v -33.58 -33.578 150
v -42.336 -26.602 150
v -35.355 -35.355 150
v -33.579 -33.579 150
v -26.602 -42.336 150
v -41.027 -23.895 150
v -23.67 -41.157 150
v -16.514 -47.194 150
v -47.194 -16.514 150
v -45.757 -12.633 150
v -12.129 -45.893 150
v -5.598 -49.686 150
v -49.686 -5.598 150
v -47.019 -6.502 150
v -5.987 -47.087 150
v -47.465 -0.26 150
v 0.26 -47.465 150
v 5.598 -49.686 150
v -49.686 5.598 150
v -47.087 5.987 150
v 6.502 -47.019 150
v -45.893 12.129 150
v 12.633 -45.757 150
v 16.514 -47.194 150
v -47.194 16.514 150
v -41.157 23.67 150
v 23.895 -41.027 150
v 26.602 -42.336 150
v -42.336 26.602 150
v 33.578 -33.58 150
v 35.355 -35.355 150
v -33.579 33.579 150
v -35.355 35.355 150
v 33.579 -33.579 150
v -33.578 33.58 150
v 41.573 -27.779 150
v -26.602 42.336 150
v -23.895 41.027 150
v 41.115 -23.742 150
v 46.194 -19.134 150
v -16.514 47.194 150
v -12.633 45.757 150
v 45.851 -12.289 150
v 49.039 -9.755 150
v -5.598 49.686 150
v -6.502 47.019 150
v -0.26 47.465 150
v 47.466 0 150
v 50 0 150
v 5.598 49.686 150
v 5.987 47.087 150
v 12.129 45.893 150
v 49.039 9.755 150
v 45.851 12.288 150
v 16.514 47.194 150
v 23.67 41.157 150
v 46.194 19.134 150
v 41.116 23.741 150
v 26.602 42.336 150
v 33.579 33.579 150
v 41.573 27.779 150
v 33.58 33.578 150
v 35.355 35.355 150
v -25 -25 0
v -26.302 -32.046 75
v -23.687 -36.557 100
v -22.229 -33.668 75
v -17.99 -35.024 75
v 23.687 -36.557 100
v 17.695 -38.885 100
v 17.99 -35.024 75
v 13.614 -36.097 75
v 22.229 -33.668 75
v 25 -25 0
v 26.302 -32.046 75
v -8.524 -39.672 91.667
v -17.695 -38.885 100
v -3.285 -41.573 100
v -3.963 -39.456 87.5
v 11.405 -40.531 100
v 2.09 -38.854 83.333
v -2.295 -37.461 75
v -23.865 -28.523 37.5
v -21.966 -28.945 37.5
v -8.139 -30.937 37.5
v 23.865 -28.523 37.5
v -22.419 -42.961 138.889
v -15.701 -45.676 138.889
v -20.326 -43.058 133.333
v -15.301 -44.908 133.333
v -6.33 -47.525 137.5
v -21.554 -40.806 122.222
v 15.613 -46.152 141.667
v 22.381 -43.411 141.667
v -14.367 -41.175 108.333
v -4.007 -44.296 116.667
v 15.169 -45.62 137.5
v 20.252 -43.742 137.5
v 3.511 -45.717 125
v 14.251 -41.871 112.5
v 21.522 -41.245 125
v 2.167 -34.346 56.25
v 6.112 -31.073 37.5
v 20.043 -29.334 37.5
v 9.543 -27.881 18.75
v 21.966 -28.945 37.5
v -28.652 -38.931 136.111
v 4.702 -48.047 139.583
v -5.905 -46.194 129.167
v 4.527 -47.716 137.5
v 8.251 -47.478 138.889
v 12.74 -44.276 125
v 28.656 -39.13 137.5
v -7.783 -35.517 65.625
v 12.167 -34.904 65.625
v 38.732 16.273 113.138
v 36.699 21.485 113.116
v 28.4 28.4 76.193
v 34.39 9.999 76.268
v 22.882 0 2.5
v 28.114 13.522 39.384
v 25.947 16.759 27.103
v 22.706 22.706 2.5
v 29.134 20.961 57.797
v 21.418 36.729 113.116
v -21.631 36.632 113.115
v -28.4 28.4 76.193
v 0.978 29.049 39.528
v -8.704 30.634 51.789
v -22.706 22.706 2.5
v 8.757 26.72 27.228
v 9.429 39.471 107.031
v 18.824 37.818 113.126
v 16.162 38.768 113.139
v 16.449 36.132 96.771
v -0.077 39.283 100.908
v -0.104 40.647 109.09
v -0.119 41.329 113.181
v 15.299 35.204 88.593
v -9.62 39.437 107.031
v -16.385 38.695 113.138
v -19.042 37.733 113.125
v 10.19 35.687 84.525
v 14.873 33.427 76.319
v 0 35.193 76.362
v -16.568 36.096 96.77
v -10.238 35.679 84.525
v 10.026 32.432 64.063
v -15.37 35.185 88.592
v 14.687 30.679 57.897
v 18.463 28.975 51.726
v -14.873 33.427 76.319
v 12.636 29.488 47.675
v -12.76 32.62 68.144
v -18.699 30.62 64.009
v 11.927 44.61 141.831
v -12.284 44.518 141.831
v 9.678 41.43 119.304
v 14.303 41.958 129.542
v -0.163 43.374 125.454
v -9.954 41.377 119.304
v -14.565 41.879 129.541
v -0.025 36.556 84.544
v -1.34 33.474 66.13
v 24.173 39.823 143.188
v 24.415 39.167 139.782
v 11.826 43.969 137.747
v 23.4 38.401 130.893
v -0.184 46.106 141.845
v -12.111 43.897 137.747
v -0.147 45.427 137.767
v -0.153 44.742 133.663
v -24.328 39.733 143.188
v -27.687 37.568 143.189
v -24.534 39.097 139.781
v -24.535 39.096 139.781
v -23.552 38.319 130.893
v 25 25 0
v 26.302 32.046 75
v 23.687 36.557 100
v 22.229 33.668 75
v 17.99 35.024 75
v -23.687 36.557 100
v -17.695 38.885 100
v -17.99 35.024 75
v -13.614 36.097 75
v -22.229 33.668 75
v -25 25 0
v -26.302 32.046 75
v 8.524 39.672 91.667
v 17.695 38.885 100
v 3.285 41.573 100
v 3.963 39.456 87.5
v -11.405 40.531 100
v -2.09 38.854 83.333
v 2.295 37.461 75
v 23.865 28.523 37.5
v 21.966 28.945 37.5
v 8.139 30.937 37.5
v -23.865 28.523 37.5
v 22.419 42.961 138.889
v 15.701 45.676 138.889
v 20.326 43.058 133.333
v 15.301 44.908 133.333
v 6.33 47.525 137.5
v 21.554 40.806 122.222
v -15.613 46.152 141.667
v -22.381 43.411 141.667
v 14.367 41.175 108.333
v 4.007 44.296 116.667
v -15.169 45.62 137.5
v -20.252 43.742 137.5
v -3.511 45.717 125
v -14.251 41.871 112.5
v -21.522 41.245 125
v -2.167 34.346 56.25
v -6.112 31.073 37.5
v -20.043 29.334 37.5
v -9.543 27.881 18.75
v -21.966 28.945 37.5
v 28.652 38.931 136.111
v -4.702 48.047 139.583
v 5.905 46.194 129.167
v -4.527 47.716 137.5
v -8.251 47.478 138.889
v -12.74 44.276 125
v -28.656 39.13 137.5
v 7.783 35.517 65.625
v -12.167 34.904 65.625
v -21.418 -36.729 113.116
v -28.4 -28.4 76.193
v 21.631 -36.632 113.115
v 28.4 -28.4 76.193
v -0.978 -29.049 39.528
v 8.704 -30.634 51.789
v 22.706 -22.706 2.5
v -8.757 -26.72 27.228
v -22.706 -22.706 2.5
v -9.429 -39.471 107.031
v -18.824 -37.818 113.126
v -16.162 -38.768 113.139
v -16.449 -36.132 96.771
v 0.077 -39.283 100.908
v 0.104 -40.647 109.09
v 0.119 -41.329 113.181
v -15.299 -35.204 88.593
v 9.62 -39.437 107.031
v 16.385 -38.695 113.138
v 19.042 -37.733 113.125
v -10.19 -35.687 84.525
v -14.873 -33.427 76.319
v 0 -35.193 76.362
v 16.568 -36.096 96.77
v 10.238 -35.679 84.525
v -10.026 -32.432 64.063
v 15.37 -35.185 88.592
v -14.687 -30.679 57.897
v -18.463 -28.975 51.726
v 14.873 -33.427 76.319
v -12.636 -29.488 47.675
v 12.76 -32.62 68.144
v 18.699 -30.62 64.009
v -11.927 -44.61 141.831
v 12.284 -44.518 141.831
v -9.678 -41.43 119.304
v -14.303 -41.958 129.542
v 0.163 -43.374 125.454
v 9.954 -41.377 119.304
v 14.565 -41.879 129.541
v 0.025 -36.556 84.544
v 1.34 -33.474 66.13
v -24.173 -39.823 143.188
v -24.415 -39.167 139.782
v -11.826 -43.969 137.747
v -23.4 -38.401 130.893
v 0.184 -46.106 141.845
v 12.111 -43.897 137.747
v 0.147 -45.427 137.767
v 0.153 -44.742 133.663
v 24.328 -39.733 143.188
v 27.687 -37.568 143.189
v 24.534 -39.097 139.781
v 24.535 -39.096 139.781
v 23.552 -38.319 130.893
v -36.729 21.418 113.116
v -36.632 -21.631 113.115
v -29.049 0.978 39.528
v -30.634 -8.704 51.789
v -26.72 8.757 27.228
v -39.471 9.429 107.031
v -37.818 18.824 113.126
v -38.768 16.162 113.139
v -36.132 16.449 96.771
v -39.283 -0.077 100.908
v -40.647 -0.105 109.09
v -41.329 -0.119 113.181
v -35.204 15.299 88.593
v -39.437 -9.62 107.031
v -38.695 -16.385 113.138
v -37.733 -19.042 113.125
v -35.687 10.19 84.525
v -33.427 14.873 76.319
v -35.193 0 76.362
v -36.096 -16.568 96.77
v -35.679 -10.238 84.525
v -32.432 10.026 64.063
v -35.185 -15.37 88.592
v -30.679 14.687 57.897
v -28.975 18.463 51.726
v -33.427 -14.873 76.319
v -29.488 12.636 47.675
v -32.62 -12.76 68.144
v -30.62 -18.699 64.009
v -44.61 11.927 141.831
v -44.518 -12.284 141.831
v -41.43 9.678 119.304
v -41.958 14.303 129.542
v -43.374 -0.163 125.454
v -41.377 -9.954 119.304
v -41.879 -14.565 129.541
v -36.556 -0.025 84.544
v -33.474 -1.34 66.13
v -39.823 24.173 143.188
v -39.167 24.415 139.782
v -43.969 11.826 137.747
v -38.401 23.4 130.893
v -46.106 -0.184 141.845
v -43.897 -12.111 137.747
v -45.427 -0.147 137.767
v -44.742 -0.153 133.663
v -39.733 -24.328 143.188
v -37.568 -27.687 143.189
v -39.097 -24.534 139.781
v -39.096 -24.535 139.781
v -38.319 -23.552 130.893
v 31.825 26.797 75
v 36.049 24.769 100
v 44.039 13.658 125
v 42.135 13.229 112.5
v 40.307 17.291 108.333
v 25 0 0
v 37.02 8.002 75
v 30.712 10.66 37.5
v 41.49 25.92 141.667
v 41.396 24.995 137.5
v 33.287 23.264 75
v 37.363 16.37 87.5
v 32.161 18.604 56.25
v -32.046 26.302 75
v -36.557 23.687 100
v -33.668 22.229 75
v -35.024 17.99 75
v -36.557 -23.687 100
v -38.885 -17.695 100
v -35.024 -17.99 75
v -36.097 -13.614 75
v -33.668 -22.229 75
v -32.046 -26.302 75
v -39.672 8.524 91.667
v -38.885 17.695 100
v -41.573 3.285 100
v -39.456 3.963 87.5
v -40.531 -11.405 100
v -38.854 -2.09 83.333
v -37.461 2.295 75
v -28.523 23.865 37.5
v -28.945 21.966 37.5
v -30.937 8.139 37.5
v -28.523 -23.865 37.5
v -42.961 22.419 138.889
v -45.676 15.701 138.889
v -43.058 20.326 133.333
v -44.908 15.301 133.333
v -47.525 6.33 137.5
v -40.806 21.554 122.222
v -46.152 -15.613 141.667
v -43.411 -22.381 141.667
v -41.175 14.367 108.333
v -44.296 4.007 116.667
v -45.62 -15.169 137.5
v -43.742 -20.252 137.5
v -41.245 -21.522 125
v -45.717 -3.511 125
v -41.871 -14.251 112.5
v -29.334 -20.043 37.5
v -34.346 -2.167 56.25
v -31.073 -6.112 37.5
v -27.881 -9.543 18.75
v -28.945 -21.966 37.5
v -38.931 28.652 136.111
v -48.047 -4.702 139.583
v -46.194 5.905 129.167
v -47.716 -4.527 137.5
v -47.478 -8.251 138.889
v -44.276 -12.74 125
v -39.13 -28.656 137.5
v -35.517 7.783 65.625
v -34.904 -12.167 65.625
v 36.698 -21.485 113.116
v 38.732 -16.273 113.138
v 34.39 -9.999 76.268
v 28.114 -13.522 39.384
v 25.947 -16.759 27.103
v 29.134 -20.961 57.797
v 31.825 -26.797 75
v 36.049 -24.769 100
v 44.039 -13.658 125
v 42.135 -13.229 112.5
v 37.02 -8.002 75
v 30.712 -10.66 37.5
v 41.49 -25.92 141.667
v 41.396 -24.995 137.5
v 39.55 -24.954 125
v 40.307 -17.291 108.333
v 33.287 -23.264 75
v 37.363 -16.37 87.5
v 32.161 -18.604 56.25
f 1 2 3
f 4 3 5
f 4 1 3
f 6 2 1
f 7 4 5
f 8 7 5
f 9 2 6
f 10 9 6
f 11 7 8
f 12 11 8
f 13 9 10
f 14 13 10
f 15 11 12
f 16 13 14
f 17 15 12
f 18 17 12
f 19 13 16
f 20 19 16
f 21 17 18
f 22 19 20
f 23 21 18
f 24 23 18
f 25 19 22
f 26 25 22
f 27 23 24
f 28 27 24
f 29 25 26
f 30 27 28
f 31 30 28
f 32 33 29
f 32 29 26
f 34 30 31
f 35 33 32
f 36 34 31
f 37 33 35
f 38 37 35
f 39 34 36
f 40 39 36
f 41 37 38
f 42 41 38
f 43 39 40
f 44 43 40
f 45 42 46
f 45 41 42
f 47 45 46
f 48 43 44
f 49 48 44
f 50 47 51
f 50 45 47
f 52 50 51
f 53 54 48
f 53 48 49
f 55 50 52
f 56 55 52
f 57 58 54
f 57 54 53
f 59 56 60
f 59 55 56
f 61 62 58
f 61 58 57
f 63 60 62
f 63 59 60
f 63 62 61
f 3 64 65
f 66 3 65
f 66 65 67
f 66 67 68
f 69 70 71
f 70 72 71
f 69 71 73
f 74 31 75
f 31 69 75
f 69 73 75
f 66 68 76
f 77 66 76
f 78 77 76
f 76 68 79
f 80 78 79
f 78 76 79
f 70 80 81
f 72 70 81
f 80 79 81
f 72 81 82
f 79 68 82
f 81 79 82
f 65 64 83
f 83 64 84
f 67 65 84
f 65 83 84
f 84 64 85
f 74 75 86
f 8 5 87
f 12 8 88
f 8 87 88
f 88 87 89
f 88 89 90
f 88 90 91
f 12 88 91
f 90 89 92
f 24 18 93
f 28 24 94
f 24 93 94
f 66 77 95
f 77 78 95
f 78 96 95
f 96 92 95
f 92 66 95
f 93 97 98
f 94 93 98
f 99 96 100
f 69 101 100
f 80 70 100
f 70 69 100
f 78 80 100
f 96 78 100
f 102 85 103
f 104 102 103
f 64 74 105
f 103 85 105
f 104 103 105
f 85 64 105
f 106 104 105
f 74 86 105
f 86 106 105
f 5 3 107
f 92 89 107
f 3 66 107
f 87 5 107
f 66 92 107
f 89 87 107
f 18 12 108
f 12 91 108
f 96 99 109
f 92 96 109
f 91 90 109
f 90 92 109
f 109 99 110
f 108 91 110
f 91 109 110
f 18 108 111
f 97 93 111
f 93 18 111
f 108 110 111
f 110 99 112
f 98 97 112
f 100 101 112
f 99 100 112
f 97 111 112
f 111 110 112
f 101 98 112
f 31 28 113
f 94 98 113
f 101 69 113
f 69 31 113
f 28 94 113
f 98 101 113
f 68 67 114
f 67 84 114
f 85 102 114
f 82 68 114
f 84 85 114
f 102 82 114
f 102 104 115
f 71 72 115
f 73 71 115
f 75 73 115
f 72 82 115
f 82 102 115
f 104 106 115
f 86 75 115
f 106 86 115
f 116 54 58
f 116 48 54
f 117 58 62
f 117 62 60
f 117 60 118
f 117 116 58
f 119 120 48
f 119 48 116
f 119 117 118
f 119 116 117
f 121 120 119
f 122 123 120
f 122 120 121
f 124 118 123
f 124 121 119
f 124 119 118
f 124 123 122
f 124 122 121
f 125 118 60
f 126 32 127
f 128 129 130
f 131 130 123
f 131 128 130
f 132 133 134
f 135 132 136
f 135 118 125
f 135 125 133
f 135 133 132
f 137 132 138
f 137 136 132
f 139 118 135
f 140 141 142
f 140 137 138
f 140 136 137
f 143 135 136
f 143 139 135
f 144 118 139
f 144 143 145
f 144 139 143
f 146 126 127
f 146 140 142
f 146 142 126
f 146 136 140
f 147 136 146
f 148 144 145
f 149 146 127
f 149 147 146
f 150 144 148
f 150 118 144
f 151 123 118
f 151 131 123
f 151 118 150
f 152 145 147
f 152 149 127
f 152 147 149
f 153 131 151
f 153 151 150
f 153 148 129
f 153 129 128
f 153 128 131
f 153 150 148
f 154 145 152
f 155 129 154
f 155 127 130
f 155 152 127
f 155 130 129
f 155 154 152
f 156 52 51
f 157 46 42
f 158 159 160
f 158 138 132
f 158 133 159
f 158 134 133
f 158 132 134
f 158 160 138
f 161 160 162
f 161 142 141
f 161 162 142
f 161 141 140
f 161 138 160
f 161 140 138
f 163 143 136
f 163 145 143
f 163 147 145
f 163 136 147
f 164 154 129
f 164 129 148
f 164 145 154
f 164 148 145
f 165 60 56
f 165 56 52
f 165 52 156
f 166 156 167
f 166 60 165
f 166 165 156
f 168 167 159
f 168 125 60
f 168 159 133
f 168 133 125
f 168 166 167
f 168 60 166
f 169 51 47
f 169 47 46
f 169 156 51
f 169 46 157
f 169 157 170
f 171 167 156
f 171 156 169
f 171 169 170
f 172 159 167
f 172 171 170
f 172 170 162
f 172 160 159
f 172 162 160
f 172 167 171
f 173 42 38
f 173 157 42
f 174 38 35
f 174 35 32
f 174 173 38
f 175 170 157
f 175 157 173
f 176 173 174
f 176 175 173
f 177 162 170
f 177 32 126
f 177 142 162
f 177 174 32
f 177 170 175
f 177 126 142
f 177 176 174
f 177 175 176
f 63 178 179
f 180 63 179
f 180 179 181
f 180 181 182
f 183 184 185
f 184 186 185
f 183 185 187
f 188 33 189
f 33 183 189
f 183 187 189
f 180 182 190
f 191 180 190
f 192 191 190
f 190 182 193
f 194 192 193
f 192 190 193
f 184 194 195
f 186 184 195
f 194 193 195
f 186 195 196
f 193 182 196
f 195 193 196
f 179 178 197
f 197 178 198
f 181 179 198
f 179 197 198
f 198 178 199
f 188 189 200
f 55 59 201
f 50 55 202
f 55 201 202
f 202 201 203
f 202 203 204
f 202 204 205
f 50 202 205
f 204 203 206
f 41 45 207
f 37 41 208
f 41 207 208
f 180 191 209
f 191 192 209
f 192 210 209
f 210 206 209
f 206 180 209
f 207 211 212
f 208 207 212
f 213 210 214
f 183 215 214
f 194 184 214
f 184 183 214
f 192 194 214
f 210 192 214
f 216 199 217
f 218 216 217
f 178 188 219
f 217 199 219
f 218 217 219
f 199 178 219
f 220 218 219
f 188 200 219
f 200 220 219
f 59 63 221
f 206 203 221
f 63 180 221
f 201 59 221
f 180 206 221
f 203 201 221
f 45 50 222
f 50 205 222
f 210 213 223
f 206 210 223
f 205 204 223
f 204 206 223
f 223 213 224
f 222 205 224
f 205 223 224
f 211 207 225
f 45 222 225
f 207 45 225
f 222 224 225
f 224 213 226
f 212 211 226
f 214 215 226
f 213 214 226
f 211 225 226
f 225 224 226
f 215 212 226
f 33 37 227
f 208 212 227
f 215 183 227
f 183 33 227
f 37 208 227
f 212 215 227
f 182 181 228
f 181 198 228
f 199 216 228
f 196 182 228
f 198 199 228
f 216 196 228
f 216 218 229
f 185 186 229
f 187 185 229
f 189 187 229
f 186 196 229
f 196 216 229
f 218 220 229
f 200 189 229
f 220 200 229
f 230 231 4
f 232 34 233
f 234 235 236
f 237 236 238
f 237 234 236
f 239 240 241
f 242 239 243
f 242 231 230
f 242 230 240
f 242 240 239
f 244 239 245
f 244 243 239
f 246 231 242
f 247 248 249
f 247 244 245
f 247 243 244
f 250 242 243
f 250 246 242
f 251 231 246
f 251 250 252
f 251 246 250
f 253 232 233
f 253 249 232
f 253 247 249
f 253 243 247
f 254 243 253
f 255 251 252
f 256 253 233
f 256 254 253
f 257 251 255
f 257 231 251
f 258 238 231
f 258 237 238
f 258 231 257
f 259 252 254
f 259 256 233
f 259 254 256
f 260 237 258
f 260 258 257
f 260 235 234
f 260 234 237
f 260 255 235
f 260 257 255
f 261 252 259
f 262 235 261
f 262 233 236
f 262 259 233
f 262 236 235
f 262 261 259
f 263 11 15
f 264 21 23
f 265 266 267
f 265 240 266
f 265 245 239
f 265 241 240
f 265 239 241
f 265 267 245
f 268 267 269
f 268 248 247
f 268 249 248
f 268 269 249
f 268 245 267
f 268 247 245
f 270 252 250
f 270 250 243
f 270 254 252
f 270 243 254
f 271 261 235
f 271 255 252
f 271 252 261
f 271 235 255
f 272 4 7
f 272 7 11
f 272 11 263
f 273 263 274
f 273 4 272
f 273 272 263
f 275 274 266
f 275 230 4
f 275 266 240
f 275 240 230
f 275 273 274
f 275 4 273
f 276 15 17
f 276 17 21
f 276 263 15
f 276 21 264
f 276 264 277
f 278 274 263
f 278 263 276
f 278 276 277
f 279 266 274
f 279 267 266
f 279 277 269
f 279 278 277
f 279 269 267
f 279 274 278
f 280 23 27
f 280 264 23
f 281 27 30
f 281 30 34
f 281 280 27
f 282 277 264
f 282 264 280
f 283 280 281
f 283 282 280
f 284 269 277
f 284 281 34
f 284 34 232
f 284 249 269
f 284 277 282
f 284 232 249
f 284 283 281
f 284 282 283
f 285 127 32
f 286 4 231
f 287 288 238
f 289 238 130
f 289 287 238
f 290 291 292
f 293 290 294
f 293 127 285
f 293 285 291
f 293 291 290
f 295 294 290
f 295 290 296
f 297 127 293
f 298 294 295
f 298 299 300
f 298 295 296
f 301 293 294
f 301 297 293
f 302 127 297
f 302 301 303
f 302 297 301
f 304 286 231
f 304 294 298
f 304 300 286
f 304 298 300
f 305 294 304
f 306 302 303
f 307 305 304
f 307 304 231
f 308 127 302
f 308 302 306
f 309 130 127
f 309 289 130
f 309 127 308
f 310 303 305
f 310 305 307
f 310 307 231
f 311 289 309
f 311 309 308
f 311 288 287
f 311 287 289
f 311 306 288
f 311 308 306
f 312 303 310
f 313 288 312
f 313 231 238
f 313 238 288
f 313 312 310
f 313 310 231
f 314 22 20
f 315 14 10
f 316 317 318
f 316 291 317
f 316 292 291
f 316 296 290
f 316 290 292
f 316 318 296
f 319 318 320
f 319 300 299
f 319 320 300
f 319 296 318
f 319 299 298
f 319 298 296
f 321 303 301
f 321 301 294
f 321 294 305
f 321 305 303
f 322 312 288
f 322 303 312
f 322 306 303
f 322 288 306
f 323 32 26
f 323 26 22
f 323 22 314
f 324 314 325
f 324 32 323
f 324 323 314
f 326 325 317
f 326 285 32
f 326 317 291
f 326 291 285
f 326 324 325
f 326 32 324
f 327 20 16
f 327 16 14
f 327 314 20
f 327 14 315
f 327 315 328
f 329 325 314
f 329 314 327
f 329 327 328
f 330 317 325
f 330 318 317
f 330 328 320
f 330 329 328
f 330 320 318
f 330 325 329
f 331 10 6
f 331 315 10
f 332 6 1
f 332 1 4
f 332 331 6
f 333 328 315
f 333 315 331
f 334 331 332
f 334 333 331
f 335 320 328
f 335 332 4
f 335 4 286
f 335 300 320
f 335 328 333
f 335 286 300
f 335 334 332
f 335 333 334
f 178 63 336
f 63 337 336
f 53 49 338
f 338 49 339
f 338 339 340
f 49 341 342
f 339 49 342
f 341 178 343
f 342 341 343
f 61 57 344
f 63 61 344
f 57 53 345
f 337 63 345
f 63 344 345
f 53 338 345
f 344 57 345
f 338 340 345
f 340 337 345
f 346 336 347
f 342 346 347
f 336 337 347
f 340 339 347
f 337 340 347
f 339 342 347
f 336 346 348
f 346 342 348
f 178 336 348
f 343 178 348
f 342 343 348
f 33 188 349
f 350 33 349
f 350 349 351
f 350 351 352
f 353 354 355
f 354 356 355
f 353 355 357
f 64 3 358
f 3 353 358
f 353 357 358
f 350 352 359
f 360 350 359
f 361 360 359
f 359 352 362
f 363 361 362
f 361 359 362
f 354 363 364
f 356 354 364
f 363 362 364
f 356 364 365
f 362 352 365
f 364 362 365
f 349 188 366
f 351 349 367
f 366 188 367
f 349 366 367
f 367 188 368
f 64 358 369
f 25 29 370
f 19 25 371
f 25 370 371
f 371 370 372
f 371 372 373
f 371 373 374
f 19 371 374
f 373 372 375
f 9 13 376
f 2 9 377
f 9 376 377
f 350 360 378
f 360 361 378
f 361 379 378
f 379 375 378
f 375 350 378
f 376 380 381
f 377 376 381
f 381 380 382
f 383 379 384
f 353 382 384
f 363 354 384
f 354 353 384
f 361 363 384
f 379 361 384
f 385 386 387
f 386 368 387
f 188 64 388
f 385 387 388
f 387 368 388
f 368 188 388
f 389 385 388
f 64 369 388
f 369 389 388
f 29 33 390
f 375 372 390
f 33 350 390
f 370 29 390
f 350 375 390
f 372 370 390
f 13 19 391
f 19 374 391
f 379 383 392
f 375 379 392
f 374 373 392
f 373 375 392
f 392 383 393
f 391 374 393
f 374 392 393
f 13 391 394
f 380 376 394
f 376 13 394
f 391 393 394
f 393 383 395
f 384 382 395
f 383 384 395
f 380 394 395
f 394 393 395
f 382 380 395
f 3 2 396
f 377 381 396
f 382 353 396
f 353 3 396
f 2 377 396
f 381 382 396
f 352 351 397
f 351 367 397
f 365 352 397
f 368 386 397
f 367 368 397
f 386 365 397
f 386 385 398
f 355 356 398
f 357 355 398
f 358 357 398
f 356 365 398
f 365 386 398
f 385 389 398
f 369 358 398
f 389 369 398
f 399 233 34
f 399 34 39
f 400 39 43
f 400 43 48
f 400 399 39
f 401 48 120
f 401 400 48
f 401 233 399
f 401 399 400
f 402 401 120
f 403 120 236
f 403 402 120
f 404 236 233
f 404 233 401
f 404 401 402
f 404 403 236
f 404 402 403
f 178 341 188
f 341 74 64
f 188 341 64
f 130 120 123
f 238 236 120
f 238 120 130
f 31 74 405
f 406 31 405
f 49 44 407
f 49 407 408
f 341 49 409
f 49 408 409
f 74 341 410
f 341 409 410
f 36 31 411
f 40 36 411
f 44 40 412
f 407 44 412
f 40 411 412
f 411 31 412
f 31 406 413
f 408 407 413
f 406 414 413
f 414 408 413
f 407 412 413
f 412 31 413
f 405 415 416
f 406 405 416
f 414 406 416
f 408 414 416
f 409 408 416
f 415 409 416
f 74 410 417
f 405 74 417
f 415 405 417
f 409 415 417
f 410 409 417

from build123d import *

# Parameters (mm, degrees)
F2_R = 50
F1_W = 50
F1_H = 50
F4_T = 2.5


# Not quite as in the source:
# - a shell that OpenCascade refuses in one call is made with other operations: the cavity is built on its own and cut out


with BuildPart() as f3:
    # F2 (on offset) → F3 section 0
    with BuildSketch(Plane.XY.offset(150)):
        Circle(F2_R)
    # F1 (on Top) → F3 section 1
    with BuildSketch(Plane.XY):
        Rectangle(F1_W, F1_H)
    loft()

    # F4: shell of thickness 2.5, made by hand


with BuildPart() as f4_core1:
    # F4_t2: copy of F3
    add(f3.part)

    # the walls: a layer under each face that stays
    f4_faces = [f4_core1.faces().sort_by_distance(p)[0] for p in [
        (35.5969883078, 15.8170858071, 75),
        (0, 37.4999999981, 75),
        (-37.4999999981, 0, 75),
        (0, -37.4999999981, 75),
        (35.5969883078, -15.8170858071, 75),
        (0, 0, 0),
    ]]
    thicken(f4_faces, amount=-F4_T, mode=Mode.SUBTRACT)


with BuildPart() as f3_1:
    add(f3.part)

    # what is left inside the walls is the cavity
    f4_cavity = [f4_core1.part.solids().sort_by_distance(p)[0] for p in [
        (-39.265085, 0, 100.949484),
    ]]
    add(f4_cavity, mode=Mode.SUBTRACT)


solid = f3_1.part
